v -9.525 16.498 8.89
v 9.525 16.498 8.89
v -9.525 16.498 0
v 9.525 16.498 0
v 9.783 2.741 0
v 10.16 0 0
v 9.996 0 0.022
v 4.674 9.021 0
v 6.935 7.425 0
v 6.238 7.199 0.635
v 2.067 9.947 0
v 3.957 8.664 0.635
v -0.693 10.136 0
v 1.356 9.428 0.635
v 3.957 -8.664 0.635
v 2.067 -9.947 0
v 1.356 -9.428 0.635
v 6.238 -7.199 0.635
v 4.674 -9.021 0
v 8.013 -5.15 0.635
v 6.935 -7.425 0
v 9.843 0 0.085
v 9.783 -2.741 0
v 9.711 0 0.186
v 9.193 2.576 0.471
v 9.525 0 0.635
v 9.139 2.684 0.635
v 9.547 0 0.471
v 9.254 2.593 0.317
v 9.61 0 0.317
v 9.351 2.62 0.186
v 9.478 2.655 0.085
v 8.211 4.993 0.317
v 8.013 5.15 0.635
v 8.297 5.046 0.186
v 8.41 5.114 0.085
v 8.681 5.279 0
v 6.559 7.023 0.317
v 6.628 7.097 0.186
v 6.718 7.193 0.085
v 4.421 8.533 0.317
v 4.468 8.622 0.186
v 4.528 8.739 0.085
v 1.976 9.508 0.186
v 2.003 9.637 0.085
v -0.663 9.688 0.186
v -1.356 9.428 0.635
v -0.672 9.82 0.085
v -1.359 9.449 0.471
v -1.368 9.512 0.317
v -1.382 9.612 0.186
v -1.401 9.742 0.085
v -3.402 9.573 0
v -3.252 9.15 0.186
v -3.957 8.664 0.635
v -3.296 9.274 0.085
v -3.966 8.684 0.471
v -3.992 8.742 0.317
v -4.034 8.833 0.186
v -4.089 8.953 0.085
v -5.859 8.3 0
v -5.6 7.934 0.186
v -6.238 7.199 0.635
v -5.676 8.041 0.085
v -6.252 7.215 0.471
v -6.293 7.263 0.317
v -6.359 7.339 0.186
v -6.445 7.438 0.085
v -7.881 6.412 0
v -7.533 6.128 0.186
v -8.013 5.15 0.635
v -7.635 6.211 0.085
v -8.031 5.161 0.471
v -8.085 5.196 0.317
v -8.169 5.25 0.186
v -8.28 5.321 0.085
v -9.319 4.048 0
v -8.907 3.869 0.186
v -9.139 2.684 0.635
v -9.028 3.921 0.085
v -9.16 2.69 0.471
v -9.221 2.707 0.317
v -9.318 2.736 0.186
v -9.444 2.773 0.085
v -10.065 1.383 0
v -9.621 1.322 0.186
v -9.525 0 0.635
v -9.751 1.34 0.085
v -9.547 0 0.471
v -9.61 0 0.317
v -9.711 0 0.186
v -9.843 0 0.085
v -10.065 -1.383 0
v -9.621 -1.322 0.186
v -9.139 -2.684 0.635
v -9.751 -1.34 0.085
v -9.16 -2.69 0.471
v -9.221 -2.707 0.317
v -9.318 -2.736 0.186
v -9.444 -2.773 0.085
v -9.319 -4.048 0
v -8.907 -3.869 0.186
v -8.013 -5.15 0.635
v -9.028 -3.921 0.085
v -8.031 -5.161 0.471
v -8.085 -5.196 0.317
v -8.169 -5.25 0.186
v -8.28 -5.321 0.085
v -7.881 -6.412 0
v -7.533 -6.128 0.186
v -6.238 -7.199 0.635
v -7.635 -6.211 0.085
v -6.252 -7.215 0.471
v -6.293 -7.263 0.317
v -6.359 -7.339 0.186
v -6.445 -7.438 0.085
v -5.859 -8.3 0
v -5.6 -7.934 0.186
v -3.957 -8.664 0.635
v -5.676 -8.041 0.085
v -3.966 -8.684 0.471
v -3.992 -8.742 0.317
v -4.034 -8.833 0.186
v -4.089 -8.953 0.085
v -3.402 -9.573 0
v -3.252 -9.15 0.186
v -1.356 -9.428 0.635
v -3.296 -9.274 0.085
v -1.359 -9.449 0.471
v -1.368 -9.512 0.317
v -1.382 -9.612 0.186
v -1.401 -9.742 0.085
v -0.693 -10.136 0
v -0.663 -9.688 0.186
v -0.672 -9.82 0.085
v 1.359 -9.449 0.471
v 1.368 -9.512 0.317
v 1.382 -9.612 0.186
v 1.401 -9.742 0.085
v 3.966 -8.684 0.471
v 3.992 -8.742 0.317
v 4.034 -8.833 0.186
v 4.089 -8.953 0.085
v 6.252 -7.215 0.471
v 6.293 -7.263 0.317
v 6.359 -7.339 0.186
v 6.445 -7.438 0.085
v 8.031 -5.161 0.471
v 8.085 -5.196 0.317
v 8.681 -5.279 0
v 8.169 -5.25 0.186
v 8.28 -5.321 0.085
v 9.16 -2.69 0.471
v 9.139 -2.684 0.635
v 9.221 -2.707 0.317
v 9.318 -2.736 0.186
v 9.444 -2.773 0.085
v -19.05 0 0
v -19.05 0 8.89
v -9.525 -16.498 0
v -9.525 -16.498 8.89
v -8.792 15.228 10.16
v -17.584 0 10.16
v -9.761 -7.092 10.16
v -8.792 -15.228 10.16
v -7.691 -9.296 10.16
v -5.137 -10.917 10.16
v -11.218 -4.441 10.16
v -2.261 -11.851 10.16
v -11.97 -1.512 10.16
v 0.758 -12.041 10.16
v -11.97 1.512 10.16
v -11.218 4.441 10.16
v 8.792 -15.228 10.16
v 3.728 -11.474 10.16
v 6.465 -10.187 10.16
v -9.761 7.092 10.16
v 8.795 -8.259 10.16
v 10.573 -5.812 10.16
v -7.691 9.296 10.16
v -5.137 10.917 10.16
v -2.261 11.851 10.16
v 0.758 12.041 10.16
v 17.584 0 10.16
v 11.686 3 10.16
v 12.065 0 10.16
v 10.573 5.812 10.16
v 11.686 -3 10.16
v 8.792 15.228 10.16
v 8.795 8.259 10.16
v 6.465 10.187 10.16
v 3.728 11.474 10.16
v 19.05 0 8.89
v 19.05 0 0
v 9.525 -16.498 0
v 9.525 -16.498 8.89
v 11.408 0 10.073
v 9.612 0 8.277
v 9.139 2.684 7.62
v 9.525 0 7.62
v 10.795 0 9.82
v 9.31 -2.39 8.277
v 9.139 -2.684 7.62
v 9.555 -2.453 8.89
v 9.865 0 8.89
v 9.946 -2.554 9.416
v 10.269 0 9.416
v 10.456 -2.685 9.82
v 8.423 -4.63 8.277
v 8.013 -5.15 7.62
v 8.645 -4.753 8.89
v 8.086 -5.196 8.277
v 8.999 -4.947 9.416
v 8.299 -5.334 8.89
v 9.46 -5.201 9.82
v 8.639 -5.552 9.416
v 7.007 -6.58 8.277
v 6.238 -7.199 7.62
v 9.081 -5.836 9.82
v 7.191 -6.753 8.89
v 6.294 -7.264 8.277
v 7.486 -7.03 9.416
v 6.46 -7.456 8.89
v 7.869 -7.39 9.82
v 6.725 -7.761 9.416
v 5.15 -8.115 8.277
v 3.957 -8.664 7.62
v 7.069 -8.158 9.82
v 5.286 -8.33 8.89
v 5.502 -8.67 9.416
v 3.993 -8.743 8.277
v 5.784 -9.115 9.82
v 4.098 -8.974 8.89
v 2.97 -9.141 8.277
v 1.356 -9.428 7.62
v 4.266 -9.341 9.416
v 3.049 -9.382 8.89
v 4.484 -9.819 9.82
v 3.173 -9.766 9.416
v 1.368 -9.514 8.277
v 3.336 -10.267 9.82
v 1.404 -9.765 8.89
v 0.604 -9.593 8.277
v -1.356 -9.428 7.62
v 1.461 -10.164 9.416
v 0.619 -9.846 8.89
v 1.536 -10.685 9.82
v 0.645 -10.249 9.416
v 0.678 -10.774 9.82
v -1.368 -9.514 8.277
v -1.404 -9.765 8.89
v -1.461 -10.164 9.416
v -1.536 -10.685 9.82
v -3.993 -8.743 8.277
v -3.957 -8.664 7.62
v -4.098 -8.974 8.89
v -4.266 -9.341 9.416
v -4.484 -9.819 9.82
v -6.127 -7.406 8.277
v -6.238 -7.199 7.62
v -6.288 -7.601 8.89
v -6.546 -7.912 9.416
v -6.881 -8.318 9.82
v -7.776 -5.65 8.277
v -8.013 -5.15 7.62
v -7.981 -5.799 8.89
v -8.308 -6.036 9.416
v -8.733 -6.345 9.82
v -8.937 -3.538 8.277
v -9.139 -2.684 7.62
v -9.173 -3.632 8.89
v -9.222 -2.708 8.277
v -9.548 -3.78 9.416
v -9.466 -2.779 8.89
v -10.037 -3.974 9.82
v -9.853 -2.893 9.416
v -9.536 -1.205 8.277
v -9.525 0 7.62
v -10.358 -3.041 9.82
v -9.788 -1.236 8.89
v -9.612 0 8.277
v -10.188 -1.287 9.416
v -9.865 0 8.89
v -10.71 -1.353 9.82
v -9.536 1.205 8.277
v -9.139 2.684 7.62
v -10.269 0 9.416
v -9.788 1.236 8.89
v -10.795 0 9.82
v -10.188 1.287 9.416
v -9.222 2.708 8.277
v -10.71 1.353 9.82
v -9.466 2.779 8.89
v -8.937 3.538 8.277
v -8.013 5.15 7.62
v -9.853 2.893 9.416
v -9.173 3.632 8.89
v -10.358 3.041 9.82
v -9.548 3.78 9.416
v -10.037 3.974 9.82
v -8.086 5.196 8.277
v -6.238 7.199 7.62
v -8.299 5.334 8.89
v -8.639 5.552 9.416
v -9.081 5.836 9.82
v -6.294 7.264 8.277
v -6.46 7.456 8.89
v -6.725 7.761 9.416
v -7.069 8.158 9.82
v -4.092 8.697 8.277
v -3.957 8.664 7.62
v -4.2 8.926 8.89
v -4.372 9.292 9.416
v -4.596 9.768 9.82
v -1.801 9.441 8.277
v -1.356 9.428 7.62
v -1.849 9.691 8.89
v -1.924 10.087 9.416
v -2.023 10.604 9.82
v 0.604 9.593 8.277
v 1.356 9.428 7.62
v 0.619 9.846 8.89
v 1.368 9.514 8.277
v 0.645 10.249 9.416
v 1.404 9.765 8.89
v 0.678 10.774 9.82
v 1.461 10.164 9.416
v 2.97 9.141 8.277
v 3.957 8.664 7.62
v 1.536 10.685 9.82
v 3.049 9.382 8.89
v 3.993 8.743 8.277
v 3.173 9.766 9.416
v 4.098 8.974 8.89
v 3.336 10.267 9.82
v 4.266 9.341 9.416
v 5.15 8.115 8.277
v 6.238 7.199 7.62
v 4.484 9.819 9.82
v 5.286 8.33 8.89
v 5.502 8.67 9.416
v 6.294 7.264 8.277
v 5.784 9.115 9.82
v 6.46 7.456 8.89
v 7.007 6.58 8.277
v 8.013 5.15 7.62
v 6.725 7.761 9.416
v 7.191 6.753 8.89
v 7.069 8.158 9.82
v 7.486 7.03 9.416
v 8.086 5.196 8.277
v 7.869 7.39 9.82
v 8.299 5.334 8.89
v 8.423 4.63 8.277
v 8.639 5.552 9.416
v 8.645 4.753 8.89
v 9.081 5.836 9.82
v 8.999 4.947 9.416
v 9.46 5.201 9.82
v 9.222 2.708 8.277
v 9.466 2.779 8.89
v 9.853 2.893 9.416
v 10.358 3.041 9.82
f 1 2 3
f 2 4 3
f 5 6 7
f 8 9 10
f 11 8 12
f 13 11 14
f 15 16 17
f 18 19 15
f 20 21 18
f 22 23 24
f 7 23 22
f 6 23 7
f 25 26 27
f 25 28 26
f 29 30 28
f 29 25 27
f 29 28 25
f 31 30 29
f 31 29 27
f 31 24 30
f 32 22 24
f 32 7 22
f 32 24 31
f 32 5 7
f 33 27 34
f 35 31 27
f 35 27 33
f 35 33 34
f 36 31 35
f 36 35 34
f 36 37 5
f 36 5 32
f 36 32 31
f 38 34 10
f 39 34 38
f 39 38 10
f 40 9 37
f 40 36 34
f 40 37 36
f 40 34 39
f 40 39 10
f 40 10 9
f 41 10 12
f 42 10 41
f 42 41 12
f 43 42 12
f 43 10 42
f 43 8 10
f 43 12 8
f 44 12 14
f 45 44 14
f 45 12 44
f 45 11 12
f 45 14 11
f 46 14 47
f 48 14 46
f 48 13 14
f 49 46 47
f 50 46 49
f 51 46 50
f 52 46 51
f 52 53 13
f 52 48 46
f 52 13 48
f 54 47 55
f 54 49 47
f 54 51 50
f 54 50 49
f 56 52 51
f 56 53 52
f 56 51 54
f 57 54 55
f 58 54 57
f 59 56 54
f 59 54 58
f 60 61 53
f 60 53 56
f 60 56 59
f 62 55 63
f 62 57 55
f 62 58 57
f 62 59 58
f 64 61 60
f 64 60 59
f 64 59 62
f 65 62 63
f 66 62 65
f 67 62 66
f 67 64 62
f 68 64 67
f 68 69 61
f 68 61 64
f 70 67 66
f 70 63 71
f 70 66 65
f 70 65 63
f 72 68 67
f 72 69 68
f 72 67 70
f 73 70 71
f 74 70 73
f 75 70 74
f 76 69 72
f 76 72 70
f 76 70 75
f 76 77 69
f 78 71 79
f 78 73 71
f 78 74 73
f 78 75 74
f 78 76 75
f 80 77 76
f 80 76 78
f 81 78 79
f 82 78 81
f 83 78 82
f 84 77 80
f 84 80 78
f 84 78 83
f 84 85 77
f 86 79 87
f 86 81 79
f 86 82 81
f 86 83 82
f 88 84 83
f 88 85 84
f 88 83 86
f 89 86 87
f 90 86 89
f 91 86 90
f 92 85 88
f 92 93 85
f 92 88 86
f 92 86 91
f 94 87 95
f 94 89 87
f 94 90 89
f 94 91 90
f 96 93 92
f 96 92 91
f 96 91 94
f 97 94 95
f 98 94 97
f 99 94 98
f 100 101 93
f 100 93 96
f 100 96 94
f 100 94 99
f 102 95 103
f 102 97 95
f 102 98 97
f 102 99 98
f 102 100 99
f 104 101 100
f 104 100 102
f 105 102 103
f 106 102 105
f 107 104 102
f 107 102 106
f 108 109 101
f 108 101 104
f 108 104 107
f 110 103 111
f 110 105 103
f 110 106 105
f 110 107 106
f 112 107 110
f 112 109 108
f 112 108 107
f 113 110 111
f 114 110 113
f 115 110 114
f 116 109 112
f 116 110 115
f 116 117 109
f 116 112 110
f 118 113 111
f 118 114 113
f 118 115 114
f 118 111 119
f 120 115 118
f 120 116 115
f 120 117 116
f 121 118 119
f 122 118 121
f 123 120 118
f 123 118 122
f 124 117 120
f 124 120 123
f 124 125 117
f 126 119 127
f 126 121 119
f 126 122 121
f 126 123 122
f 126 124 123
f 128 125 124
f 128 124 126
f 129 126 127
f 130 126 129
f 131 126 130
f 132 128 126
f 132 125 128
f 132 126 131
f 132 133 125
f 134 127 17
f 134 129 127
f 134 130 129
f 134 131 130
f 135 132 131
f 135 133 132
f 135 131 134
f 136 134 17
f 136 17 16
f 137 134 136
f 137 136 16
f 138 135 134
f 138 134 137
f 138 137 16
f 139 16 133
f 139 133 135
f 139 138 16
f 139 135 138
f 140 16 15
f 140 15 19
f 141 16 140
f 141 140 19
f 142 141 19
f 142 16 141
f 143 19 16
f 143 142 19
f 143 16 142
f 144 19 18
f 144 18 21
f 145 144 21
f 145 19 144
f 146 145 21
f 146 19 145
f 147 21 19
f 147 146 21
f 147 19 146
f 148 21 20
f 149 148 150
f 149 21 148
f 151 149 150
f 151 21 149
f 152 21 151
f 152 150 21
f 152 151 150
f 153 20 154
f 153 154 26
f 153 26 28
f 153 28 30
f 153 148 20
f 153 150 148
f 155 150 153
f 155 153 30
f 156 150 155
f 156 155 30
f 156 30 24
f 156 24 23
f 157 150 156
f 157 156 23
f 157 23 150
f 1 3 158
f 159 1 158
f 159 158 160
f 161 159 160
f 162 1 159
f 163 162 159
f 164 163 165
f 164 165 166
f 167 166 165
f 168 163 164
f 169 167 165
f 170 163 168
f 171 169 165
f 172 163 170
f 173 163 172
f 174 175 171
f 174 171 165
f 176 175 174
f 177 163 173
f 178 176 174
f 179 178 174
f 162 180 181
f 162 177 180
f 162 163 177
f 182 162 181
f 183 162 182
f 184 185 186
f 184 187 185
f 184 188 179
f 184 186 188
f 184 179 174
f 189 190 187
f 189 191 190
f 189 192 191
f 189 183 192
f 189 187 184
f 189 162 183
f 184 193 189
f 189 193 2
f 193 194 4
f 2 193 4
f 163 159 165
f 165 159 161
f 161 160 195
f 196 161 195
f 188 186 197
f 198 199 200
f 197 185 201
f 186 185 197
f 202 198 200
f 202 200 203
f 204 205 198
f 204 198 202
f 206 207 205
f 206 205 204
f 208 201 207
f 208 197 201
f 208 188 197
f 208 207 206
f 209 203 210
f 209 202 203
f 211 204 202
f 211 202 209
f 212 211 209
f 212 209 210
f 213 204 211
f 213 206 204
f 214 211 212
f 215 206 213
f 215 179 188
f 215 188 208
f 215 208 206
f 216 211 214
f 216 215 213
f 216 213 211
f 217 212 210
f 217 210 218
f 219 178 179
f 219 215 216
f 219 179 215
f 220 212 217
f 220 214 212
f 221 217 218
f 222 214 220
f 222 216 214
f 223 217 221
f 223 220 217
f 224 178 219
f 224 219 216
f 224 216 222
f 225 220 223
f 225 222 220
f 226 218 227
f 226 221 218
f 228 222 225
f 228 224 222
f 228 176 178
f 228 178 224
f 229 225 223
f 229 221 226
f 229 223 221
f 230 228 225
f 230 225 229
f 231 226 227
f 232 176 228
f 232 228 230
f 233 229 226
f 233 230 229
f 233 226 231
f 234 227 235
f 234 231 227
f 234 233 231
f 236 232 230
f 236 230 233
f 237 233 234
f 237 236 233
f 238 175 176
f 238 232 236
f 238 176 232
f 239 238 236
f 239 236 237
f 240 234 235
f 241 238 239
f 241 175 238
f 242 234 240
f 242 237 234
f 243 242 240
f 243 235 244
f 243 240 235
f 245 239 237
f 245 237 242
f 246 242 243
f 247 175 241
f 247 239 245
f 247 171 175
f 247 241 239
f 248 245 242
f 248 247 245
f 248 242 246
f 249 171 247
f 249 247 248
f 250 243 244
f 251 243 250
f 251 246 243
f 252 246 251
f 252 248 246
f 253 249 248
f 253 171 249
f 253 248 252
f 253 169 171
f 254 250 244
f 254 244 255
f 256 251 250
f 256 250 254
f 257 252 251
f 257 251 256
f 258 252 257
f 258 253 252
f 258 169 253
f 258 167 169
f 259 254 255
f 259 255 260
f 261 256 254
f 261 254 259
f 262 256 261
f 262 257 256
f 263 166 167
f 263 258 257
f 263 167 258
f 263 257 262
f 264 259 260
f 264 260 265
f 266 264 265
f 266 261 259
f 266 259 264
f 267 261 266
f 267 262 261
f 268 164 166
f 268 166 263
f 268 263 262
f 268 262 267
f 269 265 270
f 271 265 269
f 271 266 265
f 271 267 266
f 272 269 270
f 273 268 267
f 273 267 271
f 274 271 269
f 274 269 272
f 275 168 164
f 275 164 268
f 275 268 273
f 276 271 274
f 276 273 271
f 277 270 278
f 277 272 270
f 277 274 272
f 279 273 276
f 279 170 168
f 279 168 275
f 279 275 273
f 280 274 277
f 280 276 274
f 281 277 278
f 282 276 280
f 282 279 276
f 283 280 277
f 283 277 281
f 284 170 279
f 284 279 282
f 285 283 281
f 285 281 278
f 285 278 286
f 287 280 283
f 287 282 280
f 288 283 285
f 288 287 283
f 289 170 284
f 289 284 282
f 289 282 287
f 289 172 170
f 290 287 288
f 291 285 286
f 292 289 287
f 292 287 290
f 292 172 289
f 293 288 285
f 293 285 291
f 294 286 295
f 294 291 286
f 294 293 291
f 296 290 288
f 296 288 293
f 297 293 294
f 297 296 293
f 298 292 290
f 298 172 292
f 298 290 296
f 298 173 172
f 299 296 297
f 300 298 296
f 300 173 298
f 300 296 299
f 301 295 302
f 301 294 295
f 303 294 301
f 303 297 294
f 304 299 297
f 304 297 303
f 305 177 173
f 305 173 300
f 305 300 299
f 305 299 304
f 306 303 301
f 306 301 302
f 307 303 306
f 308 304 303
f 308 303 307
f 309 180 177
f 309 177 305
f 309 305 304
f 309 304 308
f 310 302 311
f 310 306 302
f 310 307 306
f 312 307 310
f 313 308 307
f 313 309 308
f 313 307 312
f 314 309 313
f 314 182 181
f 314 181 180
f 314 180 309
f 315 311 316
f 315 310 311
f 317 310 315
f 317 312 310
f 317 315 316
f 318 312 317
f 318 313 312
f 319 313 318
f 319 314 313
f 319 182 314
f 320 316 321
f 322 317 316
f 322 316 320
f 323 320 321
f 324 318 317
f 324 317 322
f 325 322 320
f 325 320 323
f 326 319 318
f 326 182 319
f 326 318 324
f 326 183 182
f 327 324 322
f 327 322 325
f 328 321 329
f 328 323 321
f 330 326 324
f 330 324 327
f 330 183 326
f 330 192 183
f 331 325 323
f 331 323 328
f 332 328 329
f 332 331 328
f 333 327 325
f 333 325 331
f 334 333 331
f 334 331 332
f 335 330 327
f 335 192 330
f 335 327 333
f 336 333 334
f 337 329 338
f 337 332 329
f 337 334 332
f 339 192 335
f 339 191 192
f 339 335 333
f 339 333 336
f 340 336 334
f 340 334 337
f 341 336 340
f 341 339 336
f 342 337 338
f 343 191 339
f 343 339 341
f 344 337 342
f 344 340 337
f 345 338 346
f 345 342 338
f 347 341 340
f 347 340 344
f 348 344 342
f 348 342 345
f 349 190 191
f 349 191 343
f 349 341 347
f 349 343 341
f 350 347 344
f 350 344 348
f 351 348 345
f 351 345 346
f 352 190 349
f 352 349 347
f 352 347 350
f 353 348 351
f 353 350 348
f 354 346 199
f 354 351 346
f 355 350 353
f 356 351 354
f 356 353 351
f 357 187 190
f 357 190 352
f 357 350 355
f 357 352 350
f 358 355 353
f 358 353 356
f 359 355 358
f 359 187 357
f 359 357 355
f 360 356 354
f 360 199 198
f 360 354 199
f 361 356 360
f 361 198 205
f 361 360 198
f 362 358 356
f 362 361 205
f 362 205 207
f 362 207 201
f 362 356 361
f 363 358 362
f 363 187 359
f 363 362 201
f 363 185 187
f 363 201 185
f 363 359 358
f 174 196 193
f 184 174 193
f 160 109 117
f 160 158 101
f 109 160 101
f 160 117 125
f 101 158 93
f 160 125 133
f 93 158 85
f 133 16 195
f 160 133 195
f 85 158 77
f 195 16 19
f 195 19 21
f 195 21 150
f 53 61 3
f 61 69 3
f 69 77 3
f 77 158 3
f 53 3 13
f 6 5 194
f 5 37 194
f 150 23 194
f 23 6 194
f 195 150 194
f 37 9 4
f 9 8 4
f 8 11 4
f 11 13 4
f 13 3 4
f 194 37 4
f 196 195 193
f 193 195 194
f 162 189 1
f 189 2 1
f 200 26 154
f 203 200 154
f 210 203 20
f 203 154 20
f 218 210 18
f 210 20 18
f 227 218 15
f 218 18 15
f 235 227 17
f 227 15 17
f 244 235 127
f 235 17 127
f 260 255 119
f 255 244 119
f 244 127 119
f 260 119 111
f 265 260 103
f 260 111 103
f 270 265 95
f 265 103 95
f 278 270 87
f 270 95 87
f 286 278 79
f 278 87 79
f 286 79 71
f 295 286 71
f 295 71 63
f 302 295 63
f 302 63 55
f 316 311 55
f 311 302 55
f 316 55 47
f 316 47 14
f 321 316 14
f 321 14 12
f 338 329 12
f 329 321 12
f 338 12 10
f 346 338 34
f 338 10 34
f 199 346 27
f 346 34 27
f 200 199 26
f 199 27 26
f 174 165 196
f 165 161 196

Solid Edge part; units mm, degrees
sketch "Sketch1" plane through (0, 0, 0) normal (0, 0, 1) x (1, 0, 0)
  line L0 (-19.05, 0) -> (-9.525, -16.4978)
  line L1 (-9.525, -16.4978) -> (9.525, -16.4978)
  line L2 (9.525, -16.4978) -> (19.05, 0)
  line L3 (19.05, 0) -> (9.525, 16.4978)
  line L4 (9.525, 16.4978) -> (-9.525, 16.4978)
  line L5 (-9.525, 16.4978) -> (-19.05, 0)
  circle A0 centre (0, 0) radius 9.525
extrude "Protrusion1" add sketch "Sketch1" along normal blind 10.16
fillet "Round_1" radius 2.54 1 edges at (-9.525, 0, 10.16)
fillet "Round1" radius 0.635 1 edges at (-9.525, 0, 0)
chamfer "Chamfer_3" distance 1.27 angle 45 6 edges at (14.2875, 8.2489, 10.16) (14.2875, -8.2489, 10.16) (0, -16.4978, 10.16) (-14.2875, -8.2489, 10.16) (-14.2875, 8.2489, 10.16) (0, 16.4978, 10.16)
